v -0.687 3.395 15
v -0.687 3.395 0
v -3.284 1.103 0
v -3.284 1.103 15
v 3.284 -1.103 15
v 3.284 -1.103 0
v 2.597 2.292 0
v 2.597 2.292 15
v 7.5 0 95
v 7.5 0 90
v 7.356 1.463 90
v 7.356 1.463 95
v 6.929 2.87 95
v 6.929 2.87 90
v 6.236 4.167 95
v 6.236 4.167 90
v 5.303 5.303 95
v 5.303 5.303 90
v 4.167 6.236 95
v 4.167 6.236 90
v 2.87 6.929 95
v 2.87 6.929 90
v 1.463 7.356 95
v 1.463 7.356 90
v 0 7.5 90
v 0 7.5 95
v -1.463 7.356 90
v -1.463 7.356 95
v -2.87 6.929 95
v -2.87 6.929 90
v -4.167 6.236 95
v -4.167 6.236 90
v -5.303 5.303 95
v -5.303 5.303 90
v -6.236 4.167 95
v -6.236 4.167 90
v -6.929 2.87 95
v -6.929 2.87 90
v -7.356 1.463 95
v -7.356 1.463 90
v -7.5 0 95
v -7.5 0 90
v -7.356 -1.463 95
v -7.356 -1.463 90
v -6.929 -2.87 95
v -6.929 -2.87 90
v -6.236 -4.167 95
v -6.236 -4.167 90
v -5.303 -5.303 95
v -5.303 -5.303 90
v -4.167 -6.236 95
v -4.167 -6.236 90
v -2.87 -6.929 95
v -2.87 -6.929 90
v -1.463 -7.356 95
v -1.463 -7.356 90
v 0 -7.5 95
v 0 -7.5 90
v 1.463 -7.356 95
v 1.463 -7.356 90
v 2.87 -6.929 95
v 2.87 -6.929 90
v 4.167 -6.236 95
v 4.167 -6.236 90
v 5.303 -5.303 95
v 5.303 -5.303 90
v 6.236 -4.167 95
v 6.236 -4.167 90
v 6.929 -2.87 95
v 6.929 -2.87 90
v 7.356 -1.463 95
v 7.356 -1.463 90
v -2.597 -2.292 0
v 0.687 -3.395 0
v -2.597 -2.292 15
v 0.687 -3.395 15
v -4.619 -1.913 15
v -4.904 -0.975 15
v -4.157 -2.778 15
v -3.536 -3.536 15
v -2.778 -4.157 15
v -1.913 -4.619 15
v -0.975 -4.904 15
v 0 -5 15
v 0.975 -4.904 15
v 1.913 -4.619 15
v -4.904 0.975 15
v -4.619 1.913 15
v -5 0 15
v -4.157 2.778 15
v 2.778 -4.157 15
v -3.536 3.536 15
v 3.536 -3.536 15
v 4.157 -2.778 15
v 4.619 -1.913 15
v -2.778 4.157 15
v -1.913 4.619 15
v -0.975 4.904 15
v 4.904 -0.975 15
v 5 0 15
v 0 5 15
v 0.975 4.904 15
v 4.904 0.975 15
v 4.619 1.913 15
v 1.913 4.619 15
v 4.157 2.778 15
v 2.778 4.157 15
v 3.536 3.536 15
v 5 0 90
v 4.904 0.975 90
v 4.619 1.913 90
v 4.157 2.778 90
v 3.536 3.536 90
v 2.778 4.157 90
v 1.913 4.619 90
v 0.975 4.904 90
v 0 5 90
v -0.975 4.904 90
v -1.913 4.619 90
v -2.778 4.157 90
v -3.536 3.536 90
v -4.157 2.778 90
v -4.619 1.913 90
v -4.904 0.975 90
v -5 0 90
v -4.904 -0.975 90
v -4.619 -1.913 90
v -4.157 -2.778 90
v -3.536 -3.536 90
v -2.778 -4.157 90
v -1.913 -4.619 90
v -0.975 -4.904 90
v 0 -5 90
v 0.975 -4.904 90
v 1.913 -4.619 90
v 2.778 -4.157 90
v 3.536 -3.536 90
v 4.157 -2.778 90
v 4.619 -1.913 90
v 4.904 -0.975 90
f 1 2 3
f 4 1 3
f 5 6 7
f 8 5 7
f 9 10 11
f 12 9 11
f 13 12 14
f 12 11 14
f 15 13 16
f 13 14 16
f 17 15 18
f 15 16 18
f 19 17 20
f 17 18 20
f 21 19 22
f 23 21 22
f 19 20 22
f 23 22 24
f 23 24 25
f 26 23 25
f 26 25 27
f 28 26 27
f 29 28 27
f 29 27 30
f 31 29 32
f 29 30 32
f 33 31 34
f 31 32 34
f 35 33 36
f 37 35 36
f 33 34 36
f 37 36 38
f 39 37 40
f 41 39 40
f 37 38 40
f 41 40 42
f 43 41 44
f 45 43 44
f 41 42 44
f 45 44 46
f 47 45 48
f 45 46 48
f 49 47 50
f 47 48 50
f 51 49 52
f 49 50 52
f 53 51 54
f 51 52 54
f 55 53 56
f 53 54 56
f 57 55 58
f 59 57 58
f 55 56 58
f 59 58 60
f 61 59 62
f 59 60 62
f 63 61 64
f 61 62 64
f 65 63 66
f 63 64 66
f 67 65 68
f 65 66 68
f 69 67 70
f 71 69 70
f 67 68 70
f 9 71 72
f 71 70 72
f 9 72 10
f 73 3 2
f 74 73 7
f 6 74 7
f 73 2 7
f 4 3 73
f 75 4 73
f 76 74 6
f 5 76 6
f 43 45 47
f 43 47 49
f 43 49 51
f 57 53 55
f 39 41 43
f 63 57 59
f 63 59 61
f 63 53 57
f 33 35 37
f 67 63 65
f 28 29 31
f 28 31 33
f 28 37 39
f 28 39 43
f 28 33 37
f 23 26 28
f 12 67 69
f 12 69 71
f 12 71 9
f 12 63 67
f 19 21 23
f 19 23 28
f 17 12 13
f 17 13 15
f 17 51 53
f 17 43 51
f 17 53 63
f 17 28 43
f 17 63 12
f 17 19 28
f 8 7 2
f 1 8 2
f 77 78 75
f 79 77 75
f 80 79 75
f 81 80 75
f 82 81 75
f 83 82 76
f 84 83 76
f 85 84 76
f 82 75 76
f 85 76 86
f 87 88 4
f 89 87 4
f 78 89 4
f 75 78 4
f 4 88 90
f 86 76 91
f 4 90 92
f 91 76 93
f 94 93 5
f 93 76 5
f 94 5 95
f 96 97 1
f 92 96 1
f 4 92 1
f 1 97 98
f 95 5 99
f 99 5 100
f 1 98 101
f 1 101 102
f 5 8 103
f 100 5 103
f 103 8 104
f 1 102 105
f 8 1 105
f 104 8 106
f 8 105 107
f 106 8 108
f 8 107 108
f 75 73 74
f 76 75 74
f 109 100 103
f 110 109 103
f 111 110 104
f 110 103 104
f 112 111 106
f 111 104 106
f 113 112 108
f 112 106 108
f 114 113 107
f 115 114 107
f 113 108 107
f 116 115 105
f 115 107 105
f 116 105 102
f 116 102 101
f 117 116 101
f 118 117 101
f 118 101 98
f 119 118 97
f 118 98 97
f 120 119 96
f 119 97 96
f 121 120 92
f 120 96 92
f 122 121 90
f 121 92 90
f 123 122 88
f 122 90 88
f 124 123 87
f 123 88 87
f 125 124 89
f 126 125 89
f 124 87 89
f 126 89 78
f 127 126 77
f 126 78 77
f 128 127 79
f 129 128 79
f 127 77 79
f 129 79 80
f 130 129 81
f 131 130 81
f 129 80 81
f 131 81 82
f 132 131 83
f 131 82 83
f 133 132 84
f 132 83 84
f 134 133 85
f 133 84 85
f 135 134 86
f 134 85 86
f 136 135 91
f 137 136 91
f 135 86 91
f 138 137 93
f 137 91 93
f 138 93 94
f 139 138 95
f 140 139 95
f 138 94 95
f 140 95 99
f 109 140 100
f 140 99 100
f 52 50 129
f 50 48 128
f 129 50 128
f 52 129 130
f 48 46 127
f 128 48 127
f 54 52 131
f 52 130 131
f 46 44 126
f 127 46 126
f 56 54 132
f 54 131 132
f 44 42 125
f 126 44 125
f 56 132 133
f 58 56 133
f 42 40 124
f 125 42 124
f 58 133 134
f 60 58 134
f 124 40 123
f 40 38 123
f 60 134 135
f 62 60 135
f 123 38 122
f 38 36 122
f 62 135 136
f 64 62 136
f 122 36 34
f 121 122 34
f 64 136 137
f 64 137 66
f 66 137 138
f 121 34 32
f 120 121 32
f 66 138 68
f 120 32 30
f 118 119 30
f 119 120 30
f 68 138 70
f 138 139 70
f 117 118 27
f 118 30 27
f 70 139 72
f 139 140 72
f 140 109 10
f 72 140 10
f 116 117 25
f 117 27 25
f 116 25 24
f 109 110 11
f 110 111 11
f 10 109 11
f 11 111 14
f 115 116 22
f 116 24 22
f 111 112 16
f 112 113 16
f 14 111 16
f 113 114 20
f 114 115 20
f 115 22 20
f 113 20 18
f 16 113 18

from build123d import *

# Parameters (mm, degrees)
BOSS_EXTRU_1_DEPTH = 15
ESQUISSE2_R        = 5
BOSS_EXTRU_2_DEPTH = 75
ESQUISSE3_R        = 7.5
BOSS_EXTRU_3_DEPTH = 5


with BuildPart() as part:
    # Esquisse1 → Boss.-Extru.1 (new body)
    with BuildSketch(Plane.XY):
        Polygon((-0.686649648, 3.395366293), (-3.283798289, 1.103027108), (-2.597148641, -2.292339185), (0.686649648, -3.395366293), (3.283798289, -1.103027108), (2.597148641, 2.292339185), align=None)
    extrude(amount=BOSS_EXTRU_1_DEPTH)

    # Esquisse2 → Boss.-Extru.2 (add)
    with BuildSketch(Plane.XY.offset(15)):
        Circle(ESQUISSE2_R)
    extrude(amount=BOSS_EXTRU_2_DEPTH)

    # Esquisse3 → Boss.-Extru.3 (add)
    with BuildSketch(Plane.XY.offset(90)):
        Circle(ESQUISSE3_R)
    extrude(amount=BOSS_EXTRU_3_DEPTH)


solid = part.part
